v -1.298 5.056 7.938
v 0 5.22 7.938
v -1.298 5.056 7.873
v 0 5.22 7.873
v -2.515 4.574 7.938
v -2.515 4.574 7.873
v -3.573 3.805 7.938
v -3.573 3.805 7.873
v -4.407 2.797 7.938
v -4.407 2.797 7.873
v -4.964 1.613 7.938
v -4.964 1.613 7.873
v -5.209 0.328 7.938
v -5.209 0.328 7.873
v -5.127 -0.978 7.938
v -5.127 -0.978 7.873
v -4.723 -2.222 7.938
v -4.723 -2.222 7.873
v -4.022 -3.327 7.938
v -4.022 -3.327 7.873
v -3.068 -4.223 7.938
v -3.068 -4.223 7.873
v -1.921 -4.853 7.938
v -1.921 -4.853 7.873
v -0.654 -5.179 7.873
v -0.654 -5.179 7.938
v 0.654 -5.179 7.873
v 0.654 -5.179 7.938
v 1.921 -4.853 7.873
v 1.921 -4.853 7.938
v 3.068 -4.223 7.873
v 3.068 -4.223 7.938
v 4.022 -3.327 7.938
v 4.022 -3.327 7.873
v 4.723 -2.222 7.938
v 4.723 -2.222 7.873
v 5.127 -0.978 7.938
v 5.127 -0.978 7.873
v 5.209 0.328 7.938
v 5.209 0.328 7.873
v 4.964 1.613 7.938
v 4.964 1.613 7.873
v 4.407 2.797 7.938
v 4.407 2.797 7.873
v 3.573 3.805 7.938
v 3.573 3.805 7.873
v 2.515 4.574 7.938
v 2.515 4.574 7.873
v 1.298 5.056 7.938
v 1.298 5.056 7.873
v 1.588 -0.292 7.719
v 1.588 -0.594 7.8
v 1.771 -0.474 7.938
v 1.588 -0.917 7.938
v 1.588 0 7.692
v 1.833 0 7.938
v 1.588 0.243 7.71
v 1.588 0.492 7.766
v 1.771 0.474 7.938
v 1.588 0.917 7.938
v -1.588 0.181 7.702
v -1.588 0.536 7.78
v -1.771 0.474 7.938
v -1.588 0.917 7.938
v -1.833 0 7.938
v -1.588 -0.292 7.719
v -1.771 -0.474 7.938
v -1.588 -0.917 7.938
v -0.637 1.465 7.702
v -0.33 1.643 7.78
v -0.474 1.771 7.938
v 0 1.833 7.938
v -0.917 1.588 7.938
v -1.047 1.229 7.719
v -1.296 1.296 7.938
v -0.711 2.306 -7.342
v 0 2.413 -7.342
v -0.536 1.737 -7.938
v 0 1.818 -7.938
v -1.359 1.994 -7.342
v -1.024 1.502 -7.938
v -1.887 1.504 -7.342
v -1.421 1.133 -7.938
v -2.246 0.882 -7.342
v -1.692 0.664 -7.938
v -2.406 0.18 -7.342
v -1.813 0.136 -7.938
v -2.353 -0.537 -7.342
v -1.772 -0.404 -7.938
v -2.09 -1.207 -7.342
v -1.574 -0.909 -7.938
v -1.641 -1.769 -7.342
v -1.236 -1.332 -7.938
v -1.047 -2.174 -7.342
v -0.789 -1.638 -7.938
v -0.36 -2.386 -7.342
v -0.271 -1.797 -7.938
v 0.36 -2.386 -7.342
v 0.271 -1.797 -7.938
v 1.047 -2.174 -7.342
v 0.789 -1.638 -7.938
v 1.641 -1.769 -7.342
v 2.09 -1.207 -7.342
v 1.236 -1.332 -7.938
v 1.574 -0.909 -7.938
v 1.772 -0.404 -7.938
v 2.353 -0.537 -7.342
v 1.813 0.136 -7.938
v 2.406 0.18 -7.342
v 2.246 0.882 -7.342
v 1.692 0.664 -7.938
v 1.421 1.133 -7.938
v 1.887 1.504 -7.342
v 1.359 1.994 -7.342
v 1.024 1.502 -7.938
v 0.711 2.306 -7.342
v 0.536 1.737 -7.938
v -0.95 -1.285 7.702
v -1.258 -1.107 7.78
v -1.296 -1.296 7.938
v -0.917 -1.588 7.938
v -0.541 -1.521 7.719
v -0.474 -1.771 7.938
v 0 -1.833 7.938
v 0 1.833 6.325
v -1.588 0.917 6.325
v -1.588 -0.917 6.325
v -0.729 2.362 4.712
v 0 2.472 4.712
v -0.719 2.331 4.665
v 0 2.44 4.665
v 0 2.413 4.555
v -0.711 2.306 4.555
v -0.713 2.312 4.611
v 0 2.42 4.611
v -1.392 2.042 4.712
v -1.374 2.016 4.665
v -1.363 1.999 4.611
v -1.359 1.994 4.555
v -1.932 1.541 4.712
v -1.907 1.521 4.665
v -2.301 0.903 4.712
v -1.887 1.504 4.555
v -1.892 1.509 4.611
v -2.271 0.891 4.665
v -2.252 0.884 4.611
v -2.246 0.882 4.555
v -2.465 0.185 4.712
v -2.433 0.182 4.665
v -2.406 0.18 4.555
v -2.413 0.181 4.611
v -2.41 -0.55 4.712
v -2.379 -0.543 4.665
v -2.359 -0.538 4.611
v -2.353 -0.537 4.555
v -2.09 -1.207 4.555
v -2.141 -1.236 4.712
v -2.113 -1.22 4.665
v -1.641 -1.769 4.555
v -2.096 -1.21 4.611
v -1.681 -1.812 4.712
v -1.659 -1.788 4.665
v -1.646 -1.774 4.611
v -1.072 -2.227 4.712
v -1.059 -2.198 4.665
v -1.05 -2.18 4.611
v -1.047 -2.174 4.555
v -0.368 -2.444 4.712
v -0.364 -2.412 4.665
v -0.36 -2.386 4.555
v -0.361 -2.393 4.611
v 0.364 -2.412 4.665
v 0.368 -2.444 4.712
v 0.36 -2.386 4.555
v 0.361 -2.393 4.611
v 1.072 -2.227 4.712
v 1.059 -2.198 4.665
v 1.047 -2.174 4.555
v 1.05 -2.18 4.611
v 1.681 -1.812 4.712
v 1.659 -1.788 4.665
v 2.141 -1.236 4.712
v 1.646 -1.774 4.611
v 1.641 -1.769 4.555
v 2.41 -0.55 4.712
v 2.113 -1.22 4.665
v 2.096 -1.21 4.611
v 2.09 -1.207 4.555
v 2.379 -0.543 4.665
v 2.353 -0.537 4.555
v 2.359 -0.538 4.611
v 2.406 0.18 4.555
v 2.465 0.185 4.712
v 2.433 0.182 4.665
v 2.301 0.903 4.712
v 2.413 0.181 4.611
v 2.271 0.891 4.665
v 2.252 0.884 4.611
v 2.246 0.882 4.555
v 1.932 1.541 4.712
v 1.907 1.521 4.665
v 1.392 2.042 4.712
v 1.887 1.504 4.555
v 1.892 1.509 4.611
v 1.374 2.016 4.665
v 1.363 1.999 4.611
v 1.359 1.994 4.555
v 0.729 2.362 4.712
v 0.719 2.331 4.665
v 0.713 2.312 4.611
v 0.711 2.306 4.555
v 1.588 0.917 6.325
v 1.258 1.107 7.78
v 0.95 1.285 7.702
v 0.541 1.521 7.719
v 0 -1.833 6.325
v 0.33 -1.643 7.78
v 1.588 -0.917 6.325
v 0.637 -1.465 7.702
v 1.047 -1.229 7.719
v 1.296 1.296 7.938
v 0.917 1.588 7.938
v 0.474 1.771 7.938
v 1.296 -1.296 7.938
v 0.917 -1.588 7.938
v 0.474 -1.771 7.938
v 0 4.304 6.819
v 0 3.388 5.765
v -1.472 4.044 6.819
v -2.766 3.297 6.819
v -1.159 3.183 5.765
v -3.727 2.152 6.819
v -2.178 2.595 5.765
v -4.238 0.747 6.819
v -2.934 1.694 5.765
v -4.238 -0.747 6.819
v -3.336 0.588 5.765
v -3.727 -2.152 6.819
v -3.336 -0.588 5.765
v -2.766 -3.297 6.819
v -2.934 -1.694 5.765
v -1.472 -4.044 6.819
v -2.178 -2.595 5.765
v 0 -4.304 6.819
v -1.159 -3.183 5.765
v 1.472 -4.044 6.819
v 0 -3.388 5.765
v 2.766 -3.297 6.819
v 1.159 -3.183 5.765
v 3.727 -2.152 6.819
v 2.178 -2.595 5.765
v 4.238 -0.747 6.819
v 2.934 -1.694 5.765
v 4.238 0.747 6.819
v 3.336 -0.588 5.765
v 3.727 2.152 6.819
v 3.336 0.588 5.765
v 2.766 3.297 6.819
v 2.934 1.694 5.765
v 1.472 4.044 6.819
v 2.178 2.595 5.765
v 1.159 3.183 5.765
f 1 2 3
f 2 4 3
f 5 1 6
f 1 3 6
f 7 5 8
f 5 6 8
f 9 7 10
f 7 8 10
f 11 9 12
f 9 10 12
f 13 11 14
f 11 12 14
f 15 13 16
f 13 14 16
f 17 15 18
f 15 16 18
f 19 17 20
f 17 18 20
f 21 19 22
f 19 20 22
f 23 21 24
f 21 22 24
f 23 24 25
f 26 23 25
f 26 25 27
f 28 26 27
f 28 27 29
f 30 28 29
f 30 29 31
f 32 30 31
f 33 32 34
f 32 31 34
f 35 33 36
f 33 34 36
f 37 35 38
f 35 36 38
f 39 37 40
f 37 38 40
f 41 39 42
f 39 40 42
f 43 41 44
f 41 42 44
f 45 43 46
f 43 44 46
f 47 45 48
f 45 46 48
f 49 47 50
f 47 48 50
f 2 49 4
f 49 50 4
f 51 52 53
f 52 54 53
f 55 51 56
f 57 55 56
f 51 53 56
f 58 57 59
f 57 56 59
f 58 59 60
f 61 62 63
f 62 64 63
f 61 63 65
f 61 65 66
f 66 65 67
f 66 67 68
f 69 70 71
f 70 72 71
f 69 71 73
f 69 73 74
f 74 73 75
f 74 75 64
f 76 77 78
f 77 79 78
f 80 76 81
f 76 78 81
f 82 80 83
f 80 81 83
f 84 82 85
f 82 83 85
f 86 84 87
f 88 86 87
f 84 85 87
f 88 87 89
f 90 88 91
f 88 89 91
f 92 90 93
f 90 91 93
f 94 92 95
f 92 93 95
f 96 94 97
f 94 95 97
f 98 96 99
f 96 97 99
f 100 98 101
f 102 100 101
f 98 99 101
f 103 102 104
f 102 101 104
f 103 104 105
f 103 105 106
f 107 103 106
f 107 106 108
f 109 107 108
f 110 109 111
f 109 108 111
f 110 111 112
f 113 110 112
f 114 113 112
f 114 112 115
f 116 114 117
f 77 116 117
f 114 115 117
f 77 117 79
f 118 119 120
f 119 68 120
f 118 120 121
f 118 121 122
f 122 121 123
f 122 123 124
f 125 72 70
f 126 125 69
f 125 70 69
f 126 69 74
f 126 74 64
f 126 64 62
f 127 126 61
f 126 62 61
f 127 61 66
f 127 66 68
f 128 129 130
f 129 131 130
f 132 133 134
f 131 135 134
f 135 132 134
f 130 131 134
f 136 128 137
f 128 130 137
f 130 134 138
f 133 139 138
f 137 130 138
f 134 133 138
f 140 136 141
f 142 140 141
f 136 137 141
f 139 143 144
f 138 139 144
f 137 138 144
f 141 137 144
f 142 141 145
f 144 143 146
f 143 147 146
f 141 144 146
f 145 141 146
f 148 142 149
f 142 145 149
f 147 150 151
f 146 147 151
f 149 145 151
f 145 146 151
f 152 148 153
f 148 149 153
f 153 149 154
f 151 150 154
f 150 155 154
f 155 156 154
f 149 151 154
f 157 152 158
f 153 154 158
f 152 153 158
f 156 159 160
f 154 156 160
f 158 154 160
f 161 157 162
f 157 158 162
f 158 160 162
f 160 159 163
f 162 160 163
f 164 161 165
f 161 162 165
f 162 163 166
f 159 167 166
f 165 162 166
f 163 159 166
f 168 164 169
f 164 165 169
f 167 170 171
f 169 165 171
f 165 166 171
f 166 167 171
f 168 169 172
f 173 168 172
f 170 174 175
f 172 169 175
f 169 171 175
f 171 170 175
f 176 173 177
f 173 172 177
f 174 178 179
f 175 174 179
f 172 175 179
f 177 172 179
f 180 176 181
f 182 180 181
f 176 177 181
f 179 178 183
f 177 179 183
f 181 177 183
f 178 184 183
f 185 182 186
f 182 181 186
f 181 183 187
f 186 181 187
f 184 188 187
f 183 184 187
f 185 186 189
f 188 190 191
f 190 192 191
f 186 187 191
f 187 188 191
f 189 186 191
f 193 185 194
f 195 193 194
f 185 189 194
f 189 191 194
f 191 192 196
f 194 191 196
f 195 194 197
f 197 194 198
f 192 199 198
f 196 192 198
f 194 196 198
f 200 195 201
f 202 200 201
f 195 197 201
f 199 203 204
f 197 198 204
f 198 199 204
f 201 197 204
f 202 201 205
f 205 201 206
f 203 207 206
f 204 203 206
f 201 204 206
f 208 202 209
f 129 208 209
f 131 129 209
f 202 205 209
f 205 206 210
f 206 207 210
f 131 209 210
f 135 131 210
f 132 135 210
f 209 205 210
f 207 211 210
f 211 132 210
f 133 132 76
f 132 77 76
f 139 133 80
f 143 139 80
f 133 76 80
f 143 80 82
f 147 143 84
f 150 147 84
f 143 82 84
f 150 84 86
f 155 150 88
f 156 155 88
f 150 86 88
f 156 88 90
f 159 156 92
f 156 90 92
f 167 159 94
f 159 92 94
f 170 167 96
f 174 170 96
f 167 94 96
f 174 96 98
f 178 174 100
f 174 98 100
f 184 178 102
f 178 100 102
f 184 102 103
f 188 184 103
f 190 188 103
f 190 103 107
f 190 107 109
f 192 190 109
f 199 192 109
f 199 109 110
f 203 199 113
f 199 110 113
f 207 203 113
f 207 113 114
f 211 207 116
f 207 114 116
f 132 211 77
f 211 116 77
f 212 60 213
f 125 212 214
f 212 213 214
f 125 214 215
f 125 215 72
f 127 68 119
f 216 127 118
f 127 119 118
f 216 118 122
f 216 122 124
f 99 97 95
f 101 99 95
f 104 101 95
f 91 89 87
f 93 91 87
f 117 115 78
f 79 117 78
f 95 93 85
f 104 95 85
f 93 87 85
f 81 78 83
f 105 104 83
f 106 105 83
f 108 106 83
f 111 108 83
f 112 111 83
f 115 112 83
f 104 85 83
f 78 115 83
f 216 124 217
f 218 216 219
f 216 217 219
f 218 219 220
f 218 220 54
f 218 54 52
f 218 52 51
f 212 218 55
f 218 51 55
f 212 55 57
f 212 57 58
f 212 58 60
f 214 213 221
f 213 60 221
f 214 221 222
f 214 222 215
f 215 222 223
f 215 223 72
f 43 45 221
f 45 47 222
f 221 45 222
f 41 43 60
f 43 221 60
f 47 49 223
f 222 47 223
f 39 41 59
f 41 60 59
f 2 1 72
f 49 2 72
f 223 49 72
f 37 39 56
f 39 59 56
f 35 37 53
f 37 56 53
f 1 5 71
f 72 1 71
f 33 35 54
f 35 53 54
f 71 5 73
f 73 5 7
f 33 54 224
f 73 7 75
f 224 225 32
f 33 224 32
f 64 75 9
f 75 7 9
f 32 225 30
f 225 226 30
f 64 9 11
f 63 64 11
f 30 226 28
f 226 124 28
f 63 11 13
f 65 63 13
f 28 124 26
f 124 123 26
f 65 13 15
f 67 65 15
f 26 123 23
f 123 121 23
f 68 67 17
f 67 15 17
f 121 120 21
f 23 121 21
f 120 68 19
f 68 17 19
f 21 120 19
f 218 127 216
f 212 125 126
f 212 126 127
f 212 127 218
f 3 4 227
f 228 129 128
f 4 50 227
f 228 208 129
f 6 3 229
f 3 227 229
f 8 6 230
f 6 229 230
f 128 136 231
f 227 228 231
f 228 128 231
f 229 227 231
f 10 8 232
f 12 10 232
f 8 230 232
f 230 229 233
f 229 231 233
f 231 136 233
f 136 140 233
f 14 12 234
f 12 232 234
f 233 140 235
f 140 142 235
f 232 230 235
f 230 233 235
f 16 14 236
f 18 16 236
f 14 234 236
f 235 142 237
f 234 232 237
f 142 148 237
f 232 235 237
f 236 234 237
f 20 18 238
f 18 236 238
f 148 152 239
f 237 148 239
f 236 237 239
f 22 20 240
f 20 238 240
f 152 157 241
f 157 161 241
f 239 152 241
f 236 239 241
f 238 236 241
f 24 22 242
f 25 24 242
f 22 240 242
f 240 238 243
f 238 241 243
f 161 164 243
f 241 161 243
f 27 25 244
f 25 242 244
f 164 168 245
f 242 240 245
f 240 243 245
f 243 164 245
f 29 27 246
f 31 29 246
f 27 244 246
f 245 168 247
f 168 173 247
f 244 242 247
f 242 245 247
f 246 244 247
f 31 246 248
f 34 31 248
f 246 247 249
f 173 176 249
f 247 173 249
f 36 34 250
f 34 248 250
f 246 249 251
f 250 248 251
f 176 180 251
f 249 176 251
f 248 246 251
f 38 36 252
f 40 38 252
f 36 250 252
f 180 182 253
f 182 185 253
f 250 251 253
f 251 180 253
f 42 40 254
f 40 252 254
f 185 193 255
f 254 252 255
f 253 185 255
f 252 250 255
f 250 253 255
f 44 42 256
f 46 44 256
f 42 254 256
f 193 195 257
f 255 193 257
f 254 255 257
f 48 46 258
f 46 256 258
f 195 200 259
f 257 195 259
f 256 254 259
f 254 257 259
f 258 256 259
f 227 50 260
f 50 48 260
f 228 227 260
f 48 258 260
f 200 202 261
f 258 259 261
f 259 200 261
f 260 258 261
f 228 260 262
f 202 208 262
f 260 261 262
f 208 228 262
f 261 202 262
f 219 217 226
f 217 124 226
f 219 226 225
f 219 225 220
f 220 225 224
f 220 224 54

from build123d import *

# Parameters (mm, degrees)
SKETCH10_R         = 1.833087105
CUT_EXTRUDE2_DEPTH = 1.6129
CUT_EXTRUDE2_DRAFT = -45
CUT_EXTRUDE1_DEPTH = 1.6129


with BuildPart() as part:
    # Sketch2 → Revolve1 (revolve)
    with BuildSketch(Plane(origin=(0, 0, 0), x_dir=(0, 0, -1), z_dir=(1, 0, 0))):
        with BuildLine():
            Line((-7.872984, 5.2197), (-4.7117, 2.471637744))
            ThreePointArc((-4.7117, 2.471637744), (-4.63858483, 2.428138789), (-4.554866229, 2.413))
            Line((-4.554866229, 2.413), (7.3421875, 2.413))
            Line((7.3421875, 2.413), (7.9375, 1.8176875))
            Line((7.9375, 1.8176875), (7.9375, 0))
            Line((7.9375, 0), (-7.9375, 0))
            Line((-7.9375, 0), (-7.9375, 5.2197))
            Line((-7.9375, 5.2197), (-7.872984, 5.2197))
        make_face()
    revolve(axis=Axis((0, 0, -7.9375), (0, 0, 1)))


with BuildPart() as cut_extrude2_tool:
    # Sketch10 → Cut-Extrude2 (with draft: the straight prism first)
    with BuildSketch(Plane.XY.offset(7.9375)):
        Circle(SKETCH10_R)
    extrude(amount=-CUT_EXTRUDE2_DEPTH)
    # Cut-Extrude2: the draft: its side faces are tilted about the plane it starts from
    cut_extrude2_sides = [cut_extrude2_tool.faces().sort_by_distance(p)[0] for p in [
        (-1.833087105, 0, 7.13105),
    ]]
    draft(cut_extrude2_sides, Plane.XY.offset(7.9375), CUT_EXTRUDE2_DRAFT)


with BuildPart() as part_1:
    add(part.part)

    # Cut-Extrude2: cut by cut_extrude2_tool
    add(cut_extrude2_tool.part, mode=Mode.SUBTRACT)

    # Sketch9 → Cut-Extrude1 (cut)
    with BuildSketch(Plane.XY.offset(7.9375)):
        Polygon((1.5875, -0.916543552), (1.5875, 0.916543552), (0, 1.833087105), (-1.5875, 0.916543552), (-1.5875, -0.916543552), (0, -1.833087105), align=None)
    extrude(amount=-CUT_EXTRUDE1_DEPTH, mode=Mode.SUBTRACT)


solid = part_1.part
